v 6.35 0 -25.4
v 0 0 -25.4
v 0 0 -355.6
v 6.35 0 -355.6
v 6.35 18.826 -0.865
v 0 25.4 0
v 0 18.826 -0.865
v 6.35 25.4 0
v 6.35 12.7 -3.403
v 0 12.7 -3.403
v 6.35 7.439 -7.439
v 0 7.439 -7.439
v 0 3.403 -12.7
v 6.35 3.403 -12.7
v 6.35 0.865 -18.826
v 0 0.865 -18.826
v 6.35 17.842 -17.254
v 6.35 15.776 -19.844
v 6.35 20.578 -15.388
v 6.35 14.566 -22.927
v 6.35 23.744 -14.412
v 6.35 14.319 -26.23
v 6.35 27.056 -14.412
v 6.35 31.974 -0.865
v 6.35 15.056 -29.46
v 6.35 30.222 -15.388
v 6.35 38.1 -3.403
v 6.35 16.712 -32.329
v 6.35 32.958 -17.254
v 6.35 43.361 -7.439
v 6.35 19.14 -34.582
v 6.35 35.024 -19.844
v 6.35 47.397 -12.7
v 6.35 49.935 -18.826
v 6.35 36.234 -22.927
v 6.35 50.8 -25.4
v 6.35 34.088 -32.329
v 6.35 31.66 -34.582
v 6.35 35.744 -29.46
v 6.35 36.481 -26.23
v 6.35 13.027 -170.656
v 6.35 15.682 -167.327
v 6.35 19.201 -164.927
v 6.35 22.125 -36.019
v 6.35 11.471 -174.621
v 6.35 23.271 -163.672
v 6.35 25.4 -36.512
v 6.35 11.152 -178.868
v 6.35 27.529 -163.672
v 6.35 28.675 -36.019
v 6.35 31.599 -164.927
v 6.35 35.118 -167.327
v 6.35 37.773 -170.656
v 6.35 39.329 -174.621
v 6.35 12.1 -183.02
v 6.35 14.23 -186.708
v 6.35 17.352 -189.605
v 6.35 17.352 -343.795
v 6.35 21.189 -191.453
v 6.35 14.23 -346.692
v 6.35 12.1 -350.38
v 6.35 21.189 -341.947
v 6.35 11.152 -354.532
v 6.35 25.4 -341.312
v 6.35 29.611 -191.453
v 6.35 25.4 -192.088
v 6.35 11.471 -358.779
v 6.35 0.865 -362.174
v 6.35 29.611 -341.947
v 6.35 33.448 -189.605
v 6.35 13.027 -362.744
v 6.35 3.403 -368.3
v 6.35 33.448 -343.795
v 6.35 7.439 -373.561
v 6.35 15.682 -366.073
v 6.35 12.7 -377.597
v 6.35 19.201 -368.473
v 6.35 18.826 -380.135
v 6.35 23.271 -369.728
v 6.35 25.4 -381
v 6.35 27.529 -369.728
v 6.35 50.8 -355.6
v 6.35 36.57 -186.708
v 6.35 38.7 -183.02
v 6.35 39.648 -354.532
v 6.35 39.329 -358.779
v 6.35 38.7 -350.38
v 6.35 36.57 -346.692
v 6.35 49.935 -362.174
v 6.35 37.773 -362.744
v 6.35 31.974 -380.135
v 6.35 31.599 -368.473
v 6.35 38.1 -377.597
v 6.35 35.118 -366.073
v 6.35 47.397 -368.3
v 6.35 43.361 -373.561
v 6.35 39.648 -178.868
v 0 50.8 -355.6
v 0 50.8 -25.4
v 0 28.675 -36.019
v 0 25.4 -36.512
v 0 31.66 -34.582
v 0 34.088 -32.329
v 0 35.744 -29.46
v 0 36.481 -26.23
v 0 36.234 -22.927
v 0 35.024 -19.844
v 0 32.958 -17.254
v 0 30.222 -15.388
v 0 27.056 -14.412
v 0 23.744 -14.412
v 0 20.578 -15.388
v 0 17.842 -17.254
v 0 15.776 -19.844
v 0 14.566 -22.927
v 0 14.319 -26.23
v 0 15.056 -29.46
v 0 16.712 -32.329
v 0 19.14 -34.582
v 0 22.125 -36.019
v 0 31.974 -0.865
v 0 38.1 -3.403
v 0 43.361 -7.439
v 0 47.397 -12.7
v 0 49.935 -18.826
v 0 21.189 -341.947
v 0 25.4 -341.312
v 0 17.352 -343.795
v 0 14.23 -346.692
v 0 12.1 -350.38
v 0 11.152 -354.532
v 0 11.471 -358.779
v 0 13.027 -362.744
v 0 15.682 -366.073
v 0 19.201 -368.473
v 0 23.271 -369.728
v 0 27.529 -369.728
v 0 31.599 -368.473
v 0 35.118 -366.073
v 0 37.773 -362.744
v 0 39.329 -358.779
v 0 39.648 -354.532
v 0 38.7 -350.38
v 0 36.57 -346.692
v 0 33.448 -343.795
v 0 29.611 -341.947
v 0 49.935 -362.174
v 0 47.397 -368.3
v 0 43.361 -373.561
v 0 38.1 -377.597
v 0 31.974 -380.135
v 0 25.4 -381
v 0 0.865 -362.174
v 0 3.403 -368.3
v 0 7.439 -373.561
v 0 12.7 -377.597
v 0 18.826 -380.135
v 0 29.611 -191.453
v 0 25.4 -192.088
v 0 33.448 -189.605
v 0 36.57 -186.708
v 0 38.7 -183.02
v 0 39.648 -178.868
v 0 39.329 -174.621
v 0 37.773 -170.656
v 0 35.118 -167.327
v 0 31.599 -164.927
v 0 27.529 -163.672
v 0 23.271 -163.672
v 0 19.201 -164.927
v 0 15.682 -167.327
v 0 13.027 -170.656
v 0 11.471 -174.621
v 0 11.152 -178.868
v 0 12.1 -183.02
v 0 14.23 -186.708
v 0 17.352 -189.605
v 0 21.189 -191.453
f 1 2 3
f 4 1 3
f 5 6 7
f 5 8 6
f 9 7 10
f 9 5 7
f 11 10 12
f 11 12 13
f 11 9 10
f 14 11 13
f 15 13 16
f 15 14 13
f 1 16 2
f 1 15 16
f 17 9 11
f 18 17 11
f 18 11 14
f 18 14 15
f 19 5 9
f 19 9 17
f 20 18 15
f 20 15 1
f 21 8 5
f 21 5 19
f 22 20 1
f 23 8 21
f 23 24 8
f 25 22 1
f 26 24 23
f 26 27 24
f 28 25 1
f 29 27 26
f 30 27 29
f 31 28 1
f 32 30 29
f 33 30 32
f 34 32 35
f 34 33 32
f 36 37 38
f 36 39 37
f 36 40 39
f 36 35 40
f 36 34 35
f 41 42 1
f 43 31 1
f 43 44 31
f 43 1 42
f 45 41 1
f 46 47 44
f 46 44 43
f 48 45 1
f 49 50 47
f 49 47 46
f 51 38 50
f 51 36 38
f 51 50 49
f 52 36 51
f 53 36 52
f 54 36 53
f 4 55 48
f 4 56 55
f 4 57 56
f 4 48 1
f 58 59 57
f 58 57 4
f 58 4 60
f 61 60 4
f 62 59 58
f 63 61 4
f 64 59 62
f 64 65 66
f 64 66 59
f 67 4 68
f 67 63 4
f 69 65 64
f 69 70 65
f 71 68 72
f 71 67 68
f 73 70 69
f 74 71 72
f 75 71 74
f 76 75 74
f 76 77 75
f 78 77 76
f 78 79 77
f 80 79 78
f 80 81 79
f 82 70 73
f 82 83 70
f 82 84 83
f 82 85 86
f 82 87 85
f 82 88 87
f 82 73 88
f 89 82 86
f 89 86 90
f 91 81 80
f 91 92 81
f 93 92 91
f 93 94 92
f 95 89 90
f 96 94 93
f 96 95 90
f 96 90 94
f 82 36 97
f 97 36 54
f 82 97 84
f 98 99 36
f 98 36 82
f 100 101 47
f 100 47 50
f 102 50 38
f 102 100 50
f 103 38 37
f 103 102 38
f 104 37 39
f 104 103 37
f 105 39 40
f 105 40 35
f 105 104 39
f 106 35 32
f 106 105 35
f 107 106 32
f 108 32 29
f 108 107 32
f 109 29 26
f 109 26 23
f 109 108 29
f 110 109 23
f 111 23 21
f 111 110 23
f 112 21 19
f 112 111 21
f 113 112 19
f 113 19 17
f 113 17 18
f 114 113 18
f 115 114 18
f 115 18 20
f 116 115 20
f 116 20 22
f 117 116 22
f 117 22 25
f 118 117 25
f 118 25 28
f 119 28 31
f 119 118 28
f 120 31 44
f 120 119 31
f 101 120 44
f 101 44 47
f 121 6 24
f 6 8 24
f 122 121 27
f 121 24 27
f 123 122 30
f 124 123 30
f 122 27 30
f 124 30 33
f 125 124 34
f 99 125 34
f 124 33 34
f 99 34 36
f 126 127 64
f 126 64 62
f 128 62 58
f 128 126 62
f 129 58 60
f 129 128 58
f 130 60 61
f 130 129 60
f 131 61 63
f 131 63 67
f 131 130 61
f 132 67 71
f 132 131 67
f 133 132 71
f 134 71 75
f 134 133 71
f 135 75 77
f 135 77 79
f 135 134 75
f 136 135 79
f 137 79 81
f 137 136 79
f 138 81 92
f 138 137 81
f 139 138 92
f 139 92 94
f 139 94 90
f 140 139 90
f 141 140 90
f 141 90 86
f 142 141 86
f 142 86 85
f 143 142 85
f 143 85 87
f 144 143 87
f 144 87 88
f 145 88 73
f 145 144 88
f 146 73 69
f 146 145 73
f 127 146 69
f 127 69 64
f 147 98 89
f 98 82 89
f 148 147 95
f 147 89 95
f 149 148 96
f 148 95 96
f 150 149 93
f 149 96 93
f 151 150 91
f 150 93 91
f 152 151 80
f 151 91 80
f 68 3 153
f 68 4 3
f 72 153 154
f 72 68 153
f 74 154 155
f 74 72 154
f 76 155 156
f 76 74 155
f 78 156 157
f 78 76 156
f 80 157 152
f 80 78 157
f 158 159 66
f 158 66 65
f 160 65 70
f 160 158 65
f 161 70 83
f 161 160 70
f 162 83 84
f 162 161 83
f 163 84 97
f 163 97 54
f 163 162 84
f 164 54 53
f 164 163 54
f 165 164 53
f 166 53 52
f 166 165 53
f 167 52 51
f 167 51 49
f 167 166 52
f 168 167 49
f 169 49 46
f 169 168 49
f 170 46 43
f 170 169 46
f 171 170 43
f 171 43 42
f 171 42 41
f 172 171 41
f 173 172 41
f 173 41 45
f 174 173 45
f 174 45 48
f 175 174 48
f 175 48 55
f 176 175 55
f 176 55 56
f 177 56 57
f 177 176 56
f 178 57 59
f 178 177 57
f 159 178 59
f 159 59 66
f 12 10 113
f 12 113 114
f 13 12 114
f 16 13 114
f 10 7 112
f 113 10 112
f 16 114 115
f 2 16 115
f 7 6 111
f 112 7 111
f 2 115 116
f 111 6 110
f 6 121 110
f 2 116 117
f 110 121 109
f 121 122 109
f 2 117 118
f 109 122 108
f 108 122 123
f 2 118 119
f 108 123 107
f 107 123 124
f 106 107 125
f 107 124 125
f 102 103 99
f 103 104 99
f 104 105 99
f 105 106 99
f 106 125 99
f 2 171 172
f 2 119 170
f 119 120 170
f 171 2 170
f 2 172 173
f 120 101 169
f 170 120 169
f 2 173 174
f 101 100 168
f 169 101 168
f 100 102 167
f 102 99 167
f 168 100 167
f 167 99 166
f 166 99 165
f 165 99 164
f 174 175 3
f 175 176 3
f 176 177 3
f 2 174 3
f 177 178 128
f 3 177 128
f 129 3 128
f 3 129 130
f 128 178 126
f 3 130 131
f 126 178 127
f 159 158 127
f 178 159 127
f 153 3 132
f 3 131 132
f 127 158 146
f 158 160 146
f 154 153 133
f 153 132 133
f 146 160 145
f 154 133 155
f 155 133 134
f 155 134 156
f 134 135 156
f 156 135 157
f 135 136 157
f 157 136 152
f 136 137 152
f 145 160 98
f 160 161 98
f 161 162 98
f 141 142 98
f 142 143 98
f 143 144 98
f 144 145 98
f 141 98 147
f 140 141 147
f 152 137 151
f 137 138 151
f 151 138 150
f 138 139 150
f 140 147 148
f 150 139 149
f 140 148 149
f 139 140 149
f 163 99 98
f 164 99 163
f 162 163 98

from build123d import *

# Parameters (mm, degrees)
SKETCH1_W           = 381
SKETCH1_H           = 50.8
SKETCH1_R           = 11.1125
SKETCH1_R_2         = 14.2875
BOSS_EXTRUDE1_DEPTH = 6.35
FILLET3_R           = 25.4


with BuildPart() as part:
    # Sketch1 → Boss-Extrude1 (new body)
    with BuildSketch(Plane(origin=(0, 0, 0), x_dir=(0, 0, -1), z_dir=(1, 0, 0))):
        with Locations((190.5, 25.4)):
            Rectangle(SKETCH1_W, SKETCH1_H)
        with Locations((25.4, 25.4)):
            Circle(SKETCH1_R, mode=Mode.SUBTRACT)
        with Locations(Location((355.6, 25.4, 0), (0, 0, 180))):
            Circle(SKETCH1_R_2, mode=Mode.SUBTRACT)
        with Locations((177.8, 25.4)):
            Circle(SKETCH1_R_2, mode=Mode.SUBTRACT)
    extrude(amount=BOSS_EXTRUDE1_DEPTH)

    # Fillet3
    fillet3_edges = [part.edges().sort_by_distance(p)[0] for p in [
        (3.175, 0, 0),
        (3.175, 50.8, 0),
        (3.175, 0, -381),
        (3.175, 50.8, -381),
    ]]
    fillet(fillet3_edges, radius=FILLET3_R - 0.0001)  # a hair under: the kernel refuses the full size


solid = part.part
